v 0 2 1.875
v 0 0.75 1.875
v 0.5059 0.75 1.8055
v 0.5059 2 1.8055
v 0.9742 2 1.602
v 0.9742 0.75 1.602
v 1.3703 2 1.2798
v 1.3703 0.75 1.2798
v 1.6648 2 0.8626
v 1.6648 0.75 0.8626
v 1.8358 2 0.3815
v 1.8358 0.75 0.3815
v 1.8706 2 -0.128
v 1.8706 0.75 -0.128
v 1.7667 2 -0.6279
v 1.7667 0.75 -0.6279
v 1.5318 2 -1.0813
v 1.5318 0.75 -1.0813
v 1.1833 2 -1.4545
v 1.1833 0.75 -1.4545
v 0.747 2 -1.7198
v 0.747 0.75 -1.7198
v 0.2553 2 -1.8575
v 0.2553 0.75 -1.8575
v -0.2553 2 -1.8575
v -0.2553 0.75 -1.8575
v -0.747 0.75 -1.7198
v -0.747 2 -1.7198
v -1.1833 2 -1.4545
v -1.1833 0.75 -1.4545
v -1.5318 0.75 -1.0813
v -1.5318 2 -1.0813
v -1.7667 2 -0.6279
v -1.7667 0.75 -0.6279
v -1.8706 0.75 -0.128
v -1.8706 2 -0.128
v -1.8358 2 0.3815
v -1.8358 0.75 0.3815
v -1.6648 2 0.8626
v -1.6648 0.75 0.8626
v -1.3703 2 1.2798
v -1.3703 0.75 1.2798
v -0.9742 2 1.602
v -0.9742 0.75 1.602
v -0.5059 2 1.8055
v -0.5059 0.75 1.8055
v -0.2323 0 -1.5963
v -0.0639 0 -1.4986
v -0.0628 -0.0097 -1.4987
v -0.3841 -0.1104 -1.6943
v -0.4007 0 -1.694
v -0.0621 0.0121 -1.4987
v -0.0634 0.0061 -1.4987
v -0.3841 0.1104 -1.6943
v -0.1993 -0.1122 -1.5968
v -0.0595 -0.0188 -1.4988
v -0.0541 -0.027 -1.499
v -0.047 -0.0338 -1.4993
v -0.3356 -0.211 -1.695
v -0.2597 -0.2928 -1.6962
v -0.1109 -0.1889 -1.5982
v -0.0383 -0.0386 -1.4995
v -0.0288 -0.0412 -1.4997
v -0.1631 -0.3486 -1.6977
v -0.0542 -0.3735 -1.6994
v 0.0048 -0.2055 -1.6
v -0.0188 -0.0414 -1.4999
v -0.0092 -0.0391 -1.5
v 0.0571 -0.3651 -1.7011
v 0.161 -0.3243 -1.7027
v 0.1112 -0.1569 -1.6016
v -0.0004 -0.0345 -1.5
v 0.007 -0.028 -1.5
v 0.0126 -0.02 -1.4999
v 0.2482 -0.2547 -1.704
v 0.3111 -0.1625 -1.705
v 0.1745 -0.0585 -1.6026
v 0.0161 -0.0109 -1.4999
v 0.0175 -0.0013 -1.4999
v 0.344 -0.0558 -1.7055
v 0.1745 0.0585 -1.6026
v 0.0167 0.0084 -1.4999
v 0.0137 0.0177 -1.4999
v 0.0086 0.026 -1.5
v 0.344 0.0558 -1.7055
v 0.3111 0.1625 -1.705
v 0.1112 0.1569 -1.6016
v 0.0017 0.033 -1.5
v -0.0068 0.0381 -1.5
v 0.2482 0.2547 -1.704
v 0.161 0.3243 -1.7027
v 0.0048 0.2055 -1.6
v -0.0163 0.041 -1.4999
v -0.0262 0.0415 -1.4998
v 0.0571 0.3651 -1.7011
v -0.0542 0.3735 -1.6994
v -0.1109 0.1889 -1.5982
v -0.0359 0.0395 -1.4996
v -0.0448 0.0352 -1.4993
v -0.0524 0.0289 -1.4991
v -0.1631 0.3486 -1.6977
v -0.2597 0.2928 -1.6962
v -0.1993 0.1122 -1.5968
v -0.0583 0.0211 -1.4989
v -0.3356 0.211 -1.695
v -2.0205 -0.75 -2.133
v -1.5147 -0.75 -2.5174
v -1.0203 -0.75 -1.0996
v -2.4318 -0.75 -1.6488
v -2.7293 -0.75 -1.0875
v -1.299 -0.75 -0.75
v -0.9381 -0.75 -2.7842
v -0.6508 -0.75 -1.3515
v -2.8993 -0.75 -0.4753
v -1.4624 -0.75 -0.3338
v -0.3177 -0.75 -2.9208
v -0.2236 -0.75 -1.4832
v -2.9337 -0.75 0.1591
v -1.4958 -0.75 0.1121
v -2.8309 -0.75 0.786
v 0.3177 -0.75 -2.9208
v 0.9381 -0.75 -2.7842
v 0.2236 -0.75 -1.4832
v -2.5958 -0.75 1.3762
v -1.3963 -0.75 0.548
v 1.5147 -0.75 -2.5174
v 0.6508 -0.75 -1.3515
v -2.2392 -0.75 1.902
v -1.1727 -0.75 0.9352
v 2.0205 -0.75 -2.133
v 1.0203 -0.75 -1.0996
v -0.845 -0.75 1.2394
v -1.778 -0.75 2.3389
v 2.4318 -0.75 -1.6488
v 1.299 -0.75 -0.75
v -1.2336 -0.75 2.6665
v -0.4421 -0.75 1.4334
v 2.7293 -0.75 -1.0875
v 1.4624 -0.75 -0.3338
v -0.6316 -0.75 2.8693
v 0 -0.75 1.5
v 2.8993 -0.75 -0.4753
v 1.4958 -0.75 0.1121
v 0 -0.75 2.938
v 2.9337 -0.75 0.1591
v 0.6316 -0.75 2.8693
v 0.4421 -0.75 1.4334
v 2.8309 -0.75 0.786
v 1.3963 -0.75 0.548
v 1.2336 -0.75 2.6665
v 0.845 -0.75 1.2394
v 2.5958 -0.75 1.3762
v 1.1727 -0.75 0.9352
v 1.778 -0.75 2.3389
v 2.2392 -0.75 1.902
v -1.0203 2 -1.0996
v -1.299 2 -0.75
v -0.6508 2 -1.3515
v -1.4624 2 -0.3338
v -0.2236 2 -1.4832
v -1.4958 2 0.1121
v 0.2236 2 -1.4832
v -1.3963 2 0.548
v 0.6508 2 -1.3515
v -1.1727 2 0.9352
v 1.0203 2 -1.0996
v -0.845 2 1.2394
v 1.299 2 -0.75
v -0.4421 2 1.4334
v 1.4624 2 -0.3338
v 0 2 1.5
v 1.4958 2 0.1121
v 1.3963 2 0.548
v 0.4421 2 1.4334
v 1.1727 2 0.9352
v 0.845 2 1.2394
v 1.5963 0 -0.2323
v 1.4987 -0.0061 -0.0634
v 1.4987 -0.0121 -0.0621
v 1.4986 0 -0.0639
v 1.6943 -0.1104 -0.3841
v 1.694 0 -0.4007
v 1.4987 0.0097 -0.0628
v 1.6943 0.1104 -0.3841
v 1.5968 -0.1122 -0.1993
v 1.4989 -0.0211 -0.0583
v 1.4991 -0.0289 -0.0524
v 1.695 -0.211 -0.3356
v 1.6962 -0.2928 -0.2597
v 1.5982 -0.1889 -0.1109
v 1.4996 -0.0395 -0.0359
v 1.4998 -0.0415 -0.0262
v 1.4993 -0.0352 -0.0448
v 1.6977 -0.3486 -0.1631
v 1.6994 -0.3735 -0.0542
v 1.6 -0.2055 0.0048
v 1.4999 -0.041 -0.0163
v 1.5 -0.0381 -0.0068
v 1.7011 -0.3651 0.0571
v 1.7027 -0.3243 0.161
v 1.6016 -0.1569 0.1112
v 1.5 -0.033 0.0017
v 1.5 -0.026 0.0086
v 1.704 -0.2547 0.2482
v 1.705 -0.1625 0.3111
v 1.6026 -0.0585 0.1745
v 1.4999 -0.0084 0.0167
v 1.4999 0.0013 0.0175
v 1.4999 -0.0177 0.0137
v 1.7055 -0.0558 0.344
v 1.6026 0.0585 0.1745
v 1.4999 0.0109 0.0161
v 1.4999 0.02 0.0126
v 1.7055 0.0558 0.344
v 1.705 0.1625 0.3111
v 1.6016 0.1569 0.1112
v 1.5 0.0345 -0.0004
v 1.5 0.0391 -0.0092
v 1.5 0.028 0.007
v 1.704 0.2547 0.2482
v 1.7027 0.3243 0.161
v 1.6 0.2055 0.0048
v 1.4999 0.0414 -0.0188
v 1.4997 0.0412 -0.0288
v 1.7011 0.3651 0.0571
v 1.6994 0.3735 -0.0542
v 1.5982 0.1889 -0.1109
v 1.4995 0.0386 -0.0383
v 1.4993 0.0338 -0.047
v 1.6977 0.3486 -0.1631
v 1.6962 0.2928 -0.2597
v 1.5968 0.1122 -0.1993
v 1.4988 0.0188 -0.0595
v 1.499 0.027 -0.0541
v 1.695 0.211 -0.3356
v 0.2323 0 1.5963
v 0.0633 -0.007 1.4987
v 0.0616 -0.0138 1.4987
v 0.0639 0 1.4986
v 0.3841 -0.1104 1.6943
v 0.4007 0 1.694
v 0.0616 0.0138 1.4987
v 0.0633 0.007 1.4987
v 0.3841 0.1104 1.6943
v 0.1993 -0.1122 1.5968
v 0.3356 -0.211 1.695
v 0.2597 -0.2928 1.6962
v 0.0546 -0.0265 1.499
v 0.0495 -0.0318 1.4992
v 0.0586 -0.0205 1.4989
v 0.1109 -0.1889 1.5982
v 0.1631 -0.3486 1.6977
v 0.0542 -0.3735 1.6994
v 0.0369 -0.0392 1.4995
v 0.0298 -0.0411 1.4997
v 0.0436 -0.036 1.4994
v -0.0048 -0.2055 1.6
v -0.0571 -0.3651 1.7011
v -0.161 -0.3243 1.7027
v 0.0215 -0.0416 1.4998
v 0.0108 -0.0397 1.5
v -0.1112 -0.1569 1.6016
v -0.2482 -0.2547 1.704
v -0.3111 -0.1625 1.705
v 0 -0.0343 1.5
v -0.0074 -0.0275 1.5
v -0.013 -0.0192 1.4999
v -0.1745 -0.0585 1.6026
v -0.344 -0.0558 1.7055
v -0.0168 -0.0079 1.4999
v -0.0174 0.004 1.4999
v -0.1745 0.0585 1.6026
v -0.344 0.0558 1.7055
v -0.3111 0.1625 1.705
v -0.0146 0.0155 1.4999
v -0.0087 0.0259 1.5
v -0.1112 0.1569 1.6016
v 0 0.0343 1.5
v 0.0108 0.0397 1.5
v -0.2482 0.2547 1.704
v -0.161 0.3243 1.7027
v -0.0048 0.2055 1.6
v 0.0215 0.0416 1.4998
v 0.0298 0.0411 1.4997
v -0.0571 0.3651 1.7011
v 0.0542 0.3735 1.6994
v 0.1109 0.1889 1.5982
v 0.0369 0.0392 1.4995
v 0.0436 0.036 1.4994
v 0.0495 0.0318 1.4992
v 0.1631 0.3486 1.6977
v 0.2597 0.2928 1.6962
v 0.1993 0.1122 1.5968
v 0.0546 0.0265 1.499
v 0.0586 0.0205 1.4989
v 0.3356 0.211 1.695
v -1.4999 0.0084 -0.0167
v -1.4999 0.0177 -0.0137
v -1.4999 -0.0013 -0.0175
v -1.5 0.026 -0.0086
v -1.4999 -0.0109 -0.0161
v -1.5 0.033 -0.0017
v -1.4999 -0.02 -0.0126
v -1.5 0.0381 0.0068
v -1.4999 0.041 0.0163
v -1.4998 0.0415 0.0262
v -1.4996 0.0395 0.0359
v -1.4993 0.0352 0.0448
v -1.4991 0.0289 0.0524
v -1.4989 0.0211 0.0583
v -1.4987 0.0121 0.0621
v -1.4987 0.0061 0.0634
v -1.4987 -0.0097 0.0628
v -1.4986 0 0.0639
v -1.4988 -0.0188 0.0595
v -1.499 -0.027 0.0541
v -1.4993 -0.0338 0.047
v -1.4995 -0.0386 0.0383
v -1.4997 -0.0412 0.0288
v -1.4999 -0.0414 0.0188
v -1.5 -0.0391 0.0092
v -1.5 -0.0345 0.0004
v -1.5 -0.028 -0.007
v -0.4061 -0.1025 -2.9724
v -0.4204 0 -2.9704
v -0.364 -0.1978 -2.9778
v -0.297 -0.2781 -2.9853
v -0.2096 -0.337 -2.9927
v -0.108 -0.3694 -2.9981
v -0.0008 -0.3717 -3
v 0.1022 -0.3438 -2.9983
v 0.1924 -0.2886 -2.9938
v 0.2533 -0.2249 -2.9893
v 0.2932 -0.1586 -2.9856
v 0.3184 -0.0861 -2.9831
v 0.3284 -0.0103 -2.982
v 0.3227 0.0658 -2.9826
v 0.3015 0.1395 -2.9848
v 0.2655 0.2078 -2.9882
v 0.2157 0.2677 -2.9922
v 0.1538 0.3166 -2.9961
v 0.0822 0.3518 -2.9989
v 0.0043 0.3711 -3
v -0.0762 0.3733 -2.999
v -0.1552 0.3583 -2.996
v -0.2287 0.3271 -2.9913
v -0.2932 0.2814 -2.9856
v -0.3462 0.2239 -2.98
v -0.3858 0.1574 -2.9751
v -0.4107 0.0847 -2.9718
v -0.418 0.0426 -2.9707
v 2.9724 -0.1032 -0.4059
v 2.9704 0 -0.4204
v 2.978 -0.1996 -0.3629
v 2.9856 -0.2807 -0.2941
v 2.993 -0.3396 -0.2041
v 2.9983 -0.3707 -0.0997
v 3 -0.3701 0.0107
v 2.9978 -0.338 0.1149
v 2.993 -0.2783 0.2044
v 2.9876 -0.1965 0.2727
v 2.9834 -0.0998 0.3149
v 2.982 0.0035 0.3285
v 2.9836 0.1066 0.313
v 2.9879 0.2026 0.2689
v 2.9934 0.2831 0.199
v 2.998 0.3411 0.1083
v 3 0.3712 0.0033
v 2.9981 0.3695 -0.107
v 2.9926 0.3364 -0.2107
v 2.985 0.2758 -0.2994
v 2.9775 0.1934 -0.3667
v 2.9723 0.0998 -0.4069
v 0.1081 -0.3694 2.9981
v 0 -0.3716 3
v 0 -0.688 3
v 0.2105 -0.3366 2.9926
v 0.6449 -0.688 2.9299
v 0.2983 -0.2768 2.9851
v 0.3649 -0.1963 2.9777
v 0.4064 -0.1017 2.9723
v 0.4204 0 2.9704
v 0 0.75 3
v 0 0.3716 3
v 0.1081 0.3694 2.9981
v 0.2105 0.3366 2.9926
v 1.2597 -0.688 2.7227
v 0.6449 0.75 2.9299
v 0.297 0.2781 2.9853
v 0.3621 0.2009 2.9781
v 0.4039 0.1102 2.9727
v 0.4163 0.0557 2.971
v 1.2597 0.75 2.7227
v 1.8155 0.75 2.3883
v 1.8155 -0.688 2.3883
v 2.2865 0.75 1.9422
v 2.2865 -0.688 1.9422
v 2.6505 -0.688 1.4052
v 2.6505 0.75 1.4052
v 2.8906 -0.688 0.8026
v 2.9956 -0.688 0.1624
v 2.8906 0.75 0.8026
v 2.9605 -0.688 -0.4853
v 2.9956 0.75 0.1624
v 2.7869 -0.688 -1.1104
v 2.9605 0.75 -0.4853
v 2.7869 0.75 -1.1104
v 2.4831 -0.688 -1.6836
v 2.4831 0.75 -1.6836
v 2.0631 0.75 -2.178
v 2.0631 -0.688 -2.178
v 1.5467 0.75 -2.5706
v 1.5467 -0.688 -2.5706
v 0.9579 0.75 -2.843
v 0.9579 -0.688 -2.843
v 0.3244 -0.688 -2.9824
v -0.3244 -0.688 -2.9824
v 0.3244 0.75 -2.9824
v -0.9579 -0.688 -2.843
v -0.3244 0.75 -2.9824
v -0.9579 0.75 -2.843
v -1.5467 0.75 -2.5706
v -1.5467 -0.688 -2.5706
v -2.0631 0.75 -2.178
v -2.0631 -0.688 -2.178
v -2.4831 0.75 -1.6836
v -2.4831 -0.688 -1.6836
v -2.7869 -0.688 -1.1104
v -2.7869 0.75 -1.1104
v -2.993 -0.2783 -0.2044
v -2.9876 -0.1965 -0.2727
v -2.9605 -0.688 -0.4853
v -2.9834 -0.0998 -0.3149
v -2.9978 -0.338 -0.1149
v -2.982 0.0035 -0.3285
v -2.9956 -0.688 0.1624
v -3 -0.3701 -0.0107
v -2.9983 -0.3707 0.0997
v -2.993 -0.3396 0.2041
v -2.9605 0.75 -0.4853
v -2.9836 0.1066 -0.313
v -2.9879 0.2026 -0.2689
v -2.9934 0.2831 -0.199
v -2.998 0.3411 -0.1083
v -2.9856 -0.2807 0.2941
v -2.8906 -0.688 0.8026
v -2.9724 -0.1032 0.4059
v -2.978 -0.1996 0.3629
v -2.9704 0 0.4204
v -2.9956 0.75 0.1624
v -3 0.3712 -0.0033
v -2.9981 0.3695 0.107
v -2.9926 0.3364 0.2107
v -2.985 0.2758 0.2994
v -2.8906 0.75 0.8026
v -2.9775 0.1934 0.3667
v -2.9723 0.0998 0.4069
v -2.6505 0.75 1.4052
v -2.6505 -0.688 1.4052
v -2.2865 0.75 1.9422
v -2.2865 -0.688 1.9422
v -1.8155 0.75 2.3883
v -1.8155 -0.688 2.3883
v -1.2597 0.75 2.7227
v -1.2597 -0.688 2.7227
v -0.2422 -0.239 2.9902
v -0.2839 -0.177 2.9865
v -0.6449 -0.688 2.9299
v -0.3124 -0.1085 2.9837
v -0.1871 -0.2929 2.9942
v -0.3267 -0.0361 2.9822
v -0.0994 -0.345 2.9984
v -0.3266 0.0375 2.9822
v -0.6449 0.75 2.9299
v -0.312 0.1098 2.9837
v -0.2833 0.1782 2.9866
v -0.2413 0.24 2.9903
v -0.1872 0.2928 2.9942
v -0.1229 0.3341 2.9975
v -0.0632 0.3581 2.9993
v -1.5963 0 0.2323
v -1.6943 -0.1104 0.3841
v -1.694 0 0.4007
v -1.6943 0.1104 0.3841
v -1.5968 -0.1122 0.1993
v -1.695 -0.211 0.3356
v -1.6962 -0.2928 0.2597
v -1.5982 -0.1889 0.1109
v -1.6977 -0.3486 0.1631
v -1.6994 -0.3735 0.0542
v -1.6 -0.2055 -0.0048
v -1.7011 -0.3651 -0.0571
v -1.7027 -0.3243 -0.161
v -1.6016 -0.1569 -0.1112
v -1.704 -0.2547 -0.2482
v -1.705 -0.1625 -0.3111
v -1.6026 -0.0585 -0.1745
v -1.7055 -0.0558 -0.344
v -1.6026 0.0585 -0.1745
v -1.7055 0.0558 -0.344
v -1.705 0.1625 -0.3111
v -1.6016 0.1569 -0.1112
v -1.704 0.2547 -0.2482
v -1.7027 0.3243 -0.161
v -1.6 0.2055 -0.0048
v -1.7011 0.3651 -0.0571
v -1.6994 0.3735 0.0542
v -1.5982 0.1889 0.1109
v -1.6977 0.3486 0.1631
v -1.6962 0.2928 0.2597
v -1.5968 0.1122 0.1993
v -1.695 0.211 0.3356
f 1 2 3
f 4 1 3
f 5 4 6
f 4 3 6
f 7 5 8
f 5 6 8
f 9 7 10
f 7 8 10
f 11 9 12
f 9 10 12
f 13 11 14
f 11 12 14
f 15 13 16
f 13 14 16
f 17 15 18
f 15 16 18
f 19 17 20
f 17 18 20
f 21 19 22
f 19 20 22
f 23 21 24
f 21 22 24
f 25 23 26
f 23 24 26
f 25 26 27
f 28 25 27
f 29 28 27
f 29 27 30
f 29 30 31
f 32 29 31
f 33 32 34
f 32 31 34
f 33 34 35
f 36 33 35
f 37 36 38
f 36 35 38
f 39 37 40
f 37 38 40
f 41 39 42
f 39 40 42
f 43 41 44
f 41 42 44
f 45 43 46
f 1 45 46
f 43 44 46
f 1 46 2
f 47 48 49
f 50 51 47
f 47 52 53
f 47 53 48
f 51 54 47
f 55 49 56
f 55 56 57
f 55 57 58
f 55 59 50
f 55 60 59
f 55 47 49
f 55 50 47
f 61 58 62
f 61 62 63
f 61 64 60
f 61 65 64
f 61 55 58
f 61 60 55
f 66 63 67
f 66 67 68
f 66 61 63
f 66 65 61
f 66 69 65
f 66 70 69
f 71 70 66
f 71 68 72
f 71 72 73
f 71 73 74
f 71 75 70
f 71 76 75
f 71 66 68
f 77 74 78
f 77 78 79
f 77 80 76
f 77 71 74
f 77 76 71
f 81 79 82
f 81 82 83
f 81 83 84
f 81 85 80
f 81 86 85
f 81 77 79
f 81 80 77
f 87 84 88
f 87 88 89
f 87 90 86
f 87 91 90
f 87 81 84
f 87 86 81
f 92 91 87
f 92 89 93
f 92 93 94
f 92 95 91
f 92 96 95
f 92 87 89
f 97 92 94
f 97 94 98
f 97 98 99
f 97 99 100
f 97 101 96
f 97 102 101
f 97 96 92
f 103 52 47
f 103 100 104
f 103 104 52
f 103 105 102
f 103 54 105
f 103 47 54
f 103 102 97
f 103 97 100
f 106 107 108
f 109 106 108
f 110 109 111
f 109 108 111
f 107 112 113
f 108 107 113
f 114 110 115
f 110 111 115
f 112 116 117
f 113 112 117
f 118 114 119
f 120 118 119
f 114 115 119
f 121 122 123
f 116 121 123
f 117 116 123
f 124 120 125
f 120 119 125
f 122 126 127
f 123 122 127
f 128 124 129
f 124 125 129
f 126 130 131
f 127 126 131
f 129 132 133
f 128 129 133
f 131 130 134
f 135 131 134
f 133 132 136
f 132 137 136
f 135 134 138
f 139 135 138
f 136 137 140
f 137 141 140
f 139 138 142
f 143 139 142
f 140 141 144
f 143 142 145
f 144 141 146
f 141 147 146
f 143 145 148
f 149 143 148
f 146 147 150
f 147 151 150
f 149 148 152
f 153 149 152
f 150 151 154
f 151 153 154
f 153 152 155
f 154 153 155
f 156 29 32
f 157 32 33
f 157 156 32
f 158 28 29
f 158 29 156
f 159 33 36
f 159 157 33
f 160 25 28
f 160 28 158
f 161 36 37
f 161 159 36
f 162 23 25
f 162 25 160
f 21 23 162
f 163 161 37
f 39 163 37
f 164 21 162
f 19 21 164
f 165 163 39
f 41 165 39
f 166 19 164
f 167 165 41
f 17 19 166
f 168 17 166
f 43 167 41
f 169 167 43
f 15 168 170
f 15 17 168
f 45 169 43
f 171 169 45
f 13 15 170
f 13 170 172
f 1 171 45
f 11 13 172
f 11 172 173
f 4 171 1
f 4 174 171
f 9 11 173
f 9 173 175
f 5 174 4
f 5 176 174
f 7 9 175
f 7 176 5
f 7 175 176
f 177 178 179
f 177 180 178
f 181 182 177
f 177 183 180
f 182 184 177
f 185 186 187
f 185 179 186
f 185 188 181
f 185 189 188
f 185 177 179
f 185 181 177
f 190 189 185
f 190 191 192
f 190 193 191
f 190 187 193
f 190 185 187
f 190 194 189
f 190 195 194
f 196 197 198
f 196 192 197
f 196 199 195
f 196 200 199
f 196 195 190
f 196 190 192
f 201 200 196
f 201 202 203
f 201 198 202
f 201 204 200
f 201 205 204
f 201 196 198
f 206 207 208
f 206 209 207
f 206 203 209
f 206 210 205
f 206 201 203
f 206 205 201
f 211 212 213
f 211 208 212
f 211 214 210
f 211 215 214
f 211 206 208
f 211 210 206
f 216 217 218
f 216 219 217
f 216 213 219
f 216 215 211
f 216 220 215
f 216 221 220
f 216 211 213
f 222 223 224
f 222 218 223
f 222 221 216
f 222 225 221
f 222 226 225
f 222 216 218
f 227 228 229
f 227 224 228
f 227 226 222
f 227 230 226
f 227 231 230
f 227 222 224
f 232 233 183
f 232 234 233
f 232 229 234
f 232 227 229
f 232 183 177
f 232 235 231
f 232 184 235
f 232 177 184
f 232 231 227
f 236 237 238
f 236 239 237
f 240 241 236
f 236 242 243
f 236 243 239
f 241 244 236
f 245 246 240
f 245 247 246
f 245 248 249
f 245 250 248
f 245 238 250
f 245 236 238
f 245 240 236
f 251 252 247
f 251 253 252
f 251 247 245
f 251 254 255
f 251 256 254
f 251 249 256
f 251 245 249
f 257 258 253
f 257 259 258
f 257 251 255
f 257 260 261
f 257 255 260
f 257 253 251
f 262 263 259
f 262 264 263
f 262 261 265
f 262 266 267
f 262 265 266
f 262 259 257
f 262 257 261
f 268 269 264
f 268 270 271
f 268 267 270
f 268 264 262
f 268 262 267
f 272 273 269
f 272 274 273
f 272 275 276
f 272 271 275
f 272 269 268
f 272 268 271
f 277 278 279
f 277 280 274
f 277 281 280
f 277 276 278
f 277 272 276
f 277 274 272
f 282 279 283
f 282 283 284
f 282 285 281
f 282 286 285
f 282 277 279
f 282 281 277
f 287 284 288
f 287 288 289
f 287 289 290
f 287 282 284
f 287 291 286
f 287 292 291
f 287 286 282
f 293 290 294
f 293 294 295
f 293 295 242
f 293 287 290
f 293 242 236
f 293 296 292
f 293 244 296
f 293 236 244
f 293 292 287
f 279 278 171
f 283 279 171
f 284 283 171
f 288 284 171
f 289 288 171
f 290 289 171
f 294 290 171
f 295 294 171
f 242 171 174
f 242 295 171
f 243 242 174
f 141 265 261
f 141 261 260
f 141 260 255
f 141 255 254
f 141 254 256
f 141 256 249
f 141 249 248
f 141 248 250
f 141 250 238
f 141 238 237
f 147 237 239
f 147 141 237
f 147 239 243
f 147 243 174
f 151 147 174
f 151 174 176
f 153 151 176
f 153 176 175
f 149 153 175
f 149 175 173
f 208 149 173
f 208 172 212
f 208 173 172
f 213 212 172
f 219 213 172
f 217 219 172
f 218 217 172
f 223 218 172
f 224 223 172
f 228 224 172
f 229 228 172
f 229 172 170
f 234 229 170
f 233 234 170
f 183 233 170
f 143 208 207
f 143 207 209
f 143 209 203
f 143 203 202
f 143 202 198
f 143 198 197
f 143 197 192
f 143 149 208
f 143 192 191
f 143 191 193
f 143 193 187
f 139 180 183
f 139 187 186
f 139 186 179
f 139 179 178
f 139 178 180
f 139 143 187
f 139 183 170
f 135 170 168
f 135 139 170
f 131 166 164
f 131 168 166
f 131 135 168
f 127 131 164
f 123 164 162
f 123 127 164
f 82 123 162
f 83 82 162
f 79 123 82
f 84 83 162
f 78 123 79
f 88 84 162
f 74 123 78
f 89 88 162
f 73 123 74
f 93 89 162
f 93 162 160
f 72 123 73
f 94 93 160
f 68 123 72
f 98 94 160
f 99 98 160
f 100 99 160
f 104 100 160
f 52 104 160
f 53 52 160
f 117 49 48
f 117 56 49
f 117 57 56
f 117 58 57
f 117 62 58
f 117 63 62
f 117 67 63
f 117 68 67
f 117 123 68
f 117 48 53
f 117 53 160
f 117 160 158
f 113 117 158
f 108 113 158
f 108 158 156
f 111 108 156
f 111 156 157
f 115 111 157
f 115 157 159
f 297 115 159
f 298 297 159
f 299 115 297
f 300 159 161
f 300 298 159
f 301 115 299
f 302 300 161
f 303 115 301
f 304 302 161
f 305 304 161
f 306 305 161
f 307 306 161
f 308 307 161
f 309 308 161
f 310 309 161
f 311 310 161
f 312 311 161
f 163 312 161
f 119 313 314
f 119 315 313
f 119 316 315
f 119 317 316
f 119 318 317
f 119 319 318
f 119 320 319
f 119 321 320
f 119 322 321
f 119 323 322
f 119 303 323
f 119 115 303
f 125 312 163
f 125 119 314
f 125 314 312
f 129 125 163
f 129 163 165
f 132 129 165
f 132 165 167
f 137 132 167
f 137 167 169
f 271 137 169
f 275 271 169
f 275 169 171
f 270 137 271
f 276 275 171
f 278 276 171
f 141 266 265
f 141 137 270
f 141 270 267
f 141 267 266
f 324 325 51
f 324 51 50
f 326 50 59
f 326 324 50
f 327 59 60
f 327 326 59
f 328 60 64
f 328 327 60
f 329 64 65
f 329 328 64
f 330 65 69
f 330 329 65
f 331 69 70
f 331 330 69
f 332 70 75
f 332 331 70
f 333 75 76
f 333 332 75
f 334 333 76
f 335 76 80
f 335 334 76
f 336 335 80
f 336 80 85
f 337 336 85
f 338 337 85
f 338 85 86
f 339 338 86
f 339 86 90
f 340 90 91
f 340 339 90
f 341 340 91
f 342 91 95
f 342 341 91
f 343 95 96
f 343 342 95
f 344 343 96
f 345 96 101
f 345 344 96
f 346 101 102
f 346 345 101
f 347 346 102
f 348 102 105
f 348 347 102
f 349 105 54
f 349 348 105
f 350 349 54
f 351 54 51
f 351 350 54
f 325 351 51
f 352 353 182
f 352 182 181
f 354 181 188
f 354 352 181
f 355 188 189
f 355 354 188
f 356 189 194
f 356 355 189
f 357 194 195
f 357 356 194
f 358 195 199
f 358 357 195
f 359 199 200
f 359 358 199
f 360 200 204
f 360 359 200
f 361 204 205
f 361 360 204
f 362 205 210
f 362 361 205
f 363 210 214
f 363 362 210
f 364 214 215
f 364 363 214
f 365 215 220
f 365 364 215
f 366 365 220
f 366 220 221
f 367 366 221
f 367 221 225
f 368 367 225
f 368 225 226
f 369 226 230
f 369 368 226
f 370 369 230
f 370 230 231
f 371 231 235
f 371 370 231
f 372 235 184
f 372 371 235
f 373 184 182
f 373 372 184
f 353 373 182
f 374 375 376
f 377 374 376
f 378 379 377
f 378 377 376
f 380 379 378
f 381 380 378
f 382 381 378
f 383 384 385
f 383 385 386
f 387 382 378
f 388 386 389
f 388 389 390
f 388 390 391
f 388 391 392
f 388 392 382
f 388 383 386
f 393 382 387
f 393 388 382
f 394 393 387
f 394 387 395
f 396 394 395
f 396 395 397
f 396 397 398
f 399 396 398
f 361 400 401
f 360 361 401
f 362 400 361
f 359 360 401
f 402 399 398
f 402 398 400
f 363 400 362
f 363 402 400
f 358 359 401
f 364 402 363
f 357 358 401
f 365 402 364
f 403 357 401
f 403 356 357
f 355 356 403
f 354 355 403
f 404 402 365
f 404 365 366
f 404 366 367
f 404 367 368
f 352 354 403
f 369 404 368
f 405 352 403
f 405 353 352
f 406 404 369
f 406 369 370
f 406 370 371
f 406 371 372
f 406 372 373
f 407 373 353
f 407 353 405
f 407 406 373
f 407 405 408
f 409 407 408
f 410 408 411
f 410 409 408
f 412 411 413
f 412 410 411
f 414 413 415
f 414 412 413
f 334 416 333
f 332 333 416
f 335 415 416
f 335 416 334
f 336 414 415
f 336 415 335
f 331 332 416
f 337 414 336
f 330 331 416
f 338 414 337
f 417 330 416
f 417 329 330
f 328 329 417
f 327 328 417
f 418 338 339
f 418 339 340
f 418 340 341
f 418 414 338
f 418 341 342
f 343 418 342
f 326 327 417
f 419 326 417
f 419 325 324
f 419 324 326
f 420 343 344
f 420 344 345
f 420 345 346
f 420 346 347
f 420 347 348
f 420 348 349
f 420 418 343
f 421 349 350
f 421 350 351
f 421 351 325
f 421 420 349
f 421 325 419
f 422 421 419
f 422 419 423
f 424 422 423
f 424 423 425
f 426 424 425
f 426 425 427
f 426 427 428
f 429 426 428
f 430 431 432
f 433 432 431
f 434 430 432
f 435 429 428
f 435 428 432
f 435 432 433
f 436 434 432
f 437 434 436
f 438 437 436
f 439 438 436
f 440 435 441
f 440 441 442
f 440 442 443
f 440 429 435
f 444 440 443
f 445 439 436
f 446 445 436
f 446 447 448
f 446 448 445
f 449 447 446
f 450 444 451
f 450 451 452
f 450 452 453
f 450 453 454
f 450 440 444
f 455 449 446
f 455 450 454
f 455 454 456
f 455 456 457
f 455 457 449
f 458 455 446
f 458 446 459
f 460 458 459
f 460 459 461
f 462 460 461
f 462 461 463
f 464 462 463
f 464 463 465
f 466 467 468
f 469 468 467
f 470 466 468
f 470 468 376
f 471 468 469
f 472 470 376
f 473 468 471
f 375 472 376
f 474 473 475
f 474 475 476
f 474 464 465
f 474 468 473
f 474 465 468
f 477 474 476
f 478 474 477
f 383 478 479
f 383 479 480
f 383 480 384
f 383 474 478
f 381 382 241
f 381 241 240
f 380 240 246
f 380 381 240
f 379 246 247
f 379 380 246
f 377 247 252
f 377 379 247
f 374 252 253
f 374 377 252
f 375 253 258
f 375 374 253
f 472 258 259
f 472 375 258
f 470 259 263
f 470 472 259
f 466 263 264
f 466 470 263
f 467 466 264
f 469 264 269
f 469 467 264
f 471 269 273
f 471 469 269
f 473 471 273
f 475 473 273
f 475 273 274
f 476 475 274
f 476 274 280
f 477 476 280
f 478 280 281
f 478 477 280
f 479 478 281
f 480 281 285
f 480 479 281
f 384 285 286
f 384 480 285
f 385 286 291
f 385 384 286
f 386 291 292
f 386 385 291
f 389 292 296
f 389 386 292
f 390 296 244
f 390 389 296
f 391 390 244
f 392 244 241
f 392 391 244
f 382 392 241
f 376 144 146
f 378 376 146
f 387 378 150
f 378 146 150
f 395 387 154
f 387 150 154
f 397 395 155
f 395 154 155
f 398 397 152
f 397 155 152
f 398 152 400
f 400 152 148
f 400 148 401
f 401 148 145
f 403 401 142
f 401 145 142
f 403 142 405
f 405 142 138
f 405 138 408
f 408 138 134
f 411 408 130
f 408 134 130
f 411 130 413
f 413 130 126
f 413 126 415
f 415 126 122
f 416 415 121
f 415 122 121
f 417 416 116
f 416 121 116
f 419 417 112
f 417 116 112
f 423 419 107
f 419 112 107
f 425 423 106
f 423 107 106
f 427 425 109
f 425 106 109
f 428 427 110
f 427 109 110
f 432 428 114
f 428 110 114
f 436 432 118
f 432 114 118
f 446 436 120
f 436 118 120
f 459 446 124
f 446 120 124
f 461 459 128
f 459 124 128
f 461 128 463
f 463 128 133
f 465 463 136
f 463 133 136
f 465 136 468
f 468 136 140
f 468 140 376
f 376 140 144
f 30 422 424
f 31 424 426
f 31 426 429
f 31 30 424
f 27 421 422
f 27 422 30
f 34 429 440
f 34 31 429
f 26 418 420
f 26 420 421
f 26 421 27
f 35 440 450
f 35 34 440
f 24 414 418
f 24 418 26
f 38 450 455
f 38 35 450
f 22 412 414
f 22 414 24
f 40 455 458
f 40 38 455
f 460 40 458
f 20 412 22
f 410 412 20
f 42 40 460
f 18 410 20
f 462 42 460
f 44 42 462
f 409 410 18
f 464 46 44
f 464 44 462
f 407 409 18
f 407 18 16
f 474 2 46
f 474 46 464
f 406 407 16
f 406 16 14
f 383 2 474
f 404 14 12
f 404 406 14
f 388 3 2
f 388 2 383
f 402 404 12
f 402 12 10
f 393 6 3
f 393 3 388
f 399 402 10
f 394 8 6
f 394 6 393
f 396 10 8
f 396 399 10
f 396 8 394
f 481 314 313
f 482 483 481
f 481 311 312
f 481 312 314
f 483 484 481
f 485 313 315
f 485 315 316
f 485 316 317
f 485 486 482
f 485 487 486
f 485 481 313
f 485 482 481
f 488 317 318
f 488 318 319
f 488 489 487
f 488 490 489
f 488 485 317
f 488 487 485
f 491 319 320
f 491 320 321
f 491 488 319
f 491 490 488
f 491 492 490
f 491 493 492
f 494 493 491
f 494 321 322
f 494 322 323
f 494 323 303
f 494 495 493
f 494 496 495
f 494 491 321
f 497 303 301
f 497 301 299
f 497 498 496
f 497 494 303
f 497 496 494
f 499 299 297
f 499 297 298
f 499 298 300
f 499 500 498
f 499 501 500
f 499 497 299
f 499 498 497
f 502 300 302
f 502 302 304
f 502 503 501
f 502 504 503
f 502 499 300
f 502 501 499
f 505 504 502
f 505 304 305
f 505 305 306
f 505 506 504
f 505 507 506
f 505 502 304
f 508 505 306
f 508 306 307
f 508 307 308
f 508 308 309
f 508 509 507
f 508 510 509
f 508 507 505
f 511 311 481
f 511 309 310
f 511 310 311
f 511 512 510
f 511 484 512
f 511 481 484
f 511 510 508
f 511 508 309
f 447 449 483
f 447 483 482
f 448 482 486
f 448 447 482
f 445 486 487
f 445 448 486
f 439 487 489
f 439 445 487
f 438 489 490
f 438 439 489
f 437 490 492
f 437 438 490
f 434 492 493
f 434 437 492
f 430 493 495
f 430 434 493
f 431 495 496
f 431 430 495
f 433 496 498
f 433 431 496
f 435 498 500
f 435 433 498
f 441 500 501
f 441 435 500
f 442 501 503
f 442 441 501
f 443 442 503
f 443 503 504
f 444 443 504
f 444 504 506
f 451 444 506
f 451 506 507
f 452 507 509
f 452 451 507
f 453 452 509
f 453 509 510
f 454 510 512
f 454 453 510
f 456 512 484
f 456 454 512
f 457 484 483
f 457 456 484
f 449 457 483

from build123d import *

# Parameters (mm, degrees)
SKETCH1_R               = 3
BOSS_EXTRUDE1_DEPTH     = 0.75
BOSS_EXTRUDE2_START     = 0.75
SKETCH1_3_R             = 1.875
BOSS_EXTRUDE2_DEPTH     = 1.25
CUT_EXTRUDE1_DEPTH      = 5.69041576
CUT_EXTRUDE1_DEPTH_BACK = 5.69041576
SKETCH1_4_R             = 1.5
CIRPATTERN1_COUNT       = 4
CHAMFER1_SIZE           = 0.062


with BuildPart() as part:
    # Sketch1 → Boss-Extrude1 (new, symmetric)
    with BuildSketch(Plane(origin=(0, 0, 0), x_dir=(1, 0, 0), z_dir=(0, 1, 0))):
        Circle(SKETCH1_R)
    extrude(amount=BOSS_EXTRUDE1_DEPTH, both=True)

    # Sketch1<3> → Boss-Extrude2 (add)
    with BuildSketch(Plane(origin=(0, 0, 0), x_dir=(1, 0, 0), z_dir=(0, 1, 0)).offset(BOSS_EXTRUDE2_START)):
        Circle(SKETCH1_3_R)
    extrude(amount=BOSS_EXTRUDE2_DEPTH)

    # Sketch1<4> → Cut-Extrude1 (cut, two sides: drawn at the far end of the back side and taken through both)
    with BuildSketch(Plane(origin=(0, 0, 0), x_dir=(1, 0, 0), z_dir=(0, 1, 0)).offset(-CUT_EXTRUDE1_DEPTH_BACK)):
        Circle(SKETCH1_4_R)
    extrude(amount=CUT_EXTRUDE1_DEPTH + CUT_EXTRUDE1_DEPTH_BACK, mode=Mode.SUBTRACT)

    # Sketch4 → Ø1.0mm Dowel Hole1 (revolve, cut)
    with BuildSketch(Plane(origin=(0.046321233, 0, 2.999642369), x_dir=(0.999880789746526, 0, -0.015440411129998149), z_dir=(0, 1, 0))):
        Polygon((0, 0), (0, 1.525022302), (0.3745, 1.3), (0.3745, 0), align=None)
    f_1_0mm_dowel_hole1 = revolve(axis=Axis((0.144367844, 0, 9.348885384), (-0.015440411129998149, 0, -0.999880789746526)), mode=Mode.SUBTRACT)

    # CirPattern1: Ø1.0mm Dowel Hole1 ×4 about axis
    cirpattern1_axis = Axis((0, 0.75, 0), (0, 1, 0))
    for i in range(1, CIRPATTERN1_COUNT):
        add(f_1_0mm_dowel_hole1.rotate(cirpattern1_axis, i * 360 / CIRPATTERN1_COUNT), mode=Mode.SUBTRACT)

    # Chamfer1
    chamfer1_edges = [part.edges().sort_by_distance(p)[0] for p in [
        (-3, -0.75, 0),
    ]]
    chamfer(chamfer1_edges, length=CHAMFER1_SIZE)


solid = part.part
